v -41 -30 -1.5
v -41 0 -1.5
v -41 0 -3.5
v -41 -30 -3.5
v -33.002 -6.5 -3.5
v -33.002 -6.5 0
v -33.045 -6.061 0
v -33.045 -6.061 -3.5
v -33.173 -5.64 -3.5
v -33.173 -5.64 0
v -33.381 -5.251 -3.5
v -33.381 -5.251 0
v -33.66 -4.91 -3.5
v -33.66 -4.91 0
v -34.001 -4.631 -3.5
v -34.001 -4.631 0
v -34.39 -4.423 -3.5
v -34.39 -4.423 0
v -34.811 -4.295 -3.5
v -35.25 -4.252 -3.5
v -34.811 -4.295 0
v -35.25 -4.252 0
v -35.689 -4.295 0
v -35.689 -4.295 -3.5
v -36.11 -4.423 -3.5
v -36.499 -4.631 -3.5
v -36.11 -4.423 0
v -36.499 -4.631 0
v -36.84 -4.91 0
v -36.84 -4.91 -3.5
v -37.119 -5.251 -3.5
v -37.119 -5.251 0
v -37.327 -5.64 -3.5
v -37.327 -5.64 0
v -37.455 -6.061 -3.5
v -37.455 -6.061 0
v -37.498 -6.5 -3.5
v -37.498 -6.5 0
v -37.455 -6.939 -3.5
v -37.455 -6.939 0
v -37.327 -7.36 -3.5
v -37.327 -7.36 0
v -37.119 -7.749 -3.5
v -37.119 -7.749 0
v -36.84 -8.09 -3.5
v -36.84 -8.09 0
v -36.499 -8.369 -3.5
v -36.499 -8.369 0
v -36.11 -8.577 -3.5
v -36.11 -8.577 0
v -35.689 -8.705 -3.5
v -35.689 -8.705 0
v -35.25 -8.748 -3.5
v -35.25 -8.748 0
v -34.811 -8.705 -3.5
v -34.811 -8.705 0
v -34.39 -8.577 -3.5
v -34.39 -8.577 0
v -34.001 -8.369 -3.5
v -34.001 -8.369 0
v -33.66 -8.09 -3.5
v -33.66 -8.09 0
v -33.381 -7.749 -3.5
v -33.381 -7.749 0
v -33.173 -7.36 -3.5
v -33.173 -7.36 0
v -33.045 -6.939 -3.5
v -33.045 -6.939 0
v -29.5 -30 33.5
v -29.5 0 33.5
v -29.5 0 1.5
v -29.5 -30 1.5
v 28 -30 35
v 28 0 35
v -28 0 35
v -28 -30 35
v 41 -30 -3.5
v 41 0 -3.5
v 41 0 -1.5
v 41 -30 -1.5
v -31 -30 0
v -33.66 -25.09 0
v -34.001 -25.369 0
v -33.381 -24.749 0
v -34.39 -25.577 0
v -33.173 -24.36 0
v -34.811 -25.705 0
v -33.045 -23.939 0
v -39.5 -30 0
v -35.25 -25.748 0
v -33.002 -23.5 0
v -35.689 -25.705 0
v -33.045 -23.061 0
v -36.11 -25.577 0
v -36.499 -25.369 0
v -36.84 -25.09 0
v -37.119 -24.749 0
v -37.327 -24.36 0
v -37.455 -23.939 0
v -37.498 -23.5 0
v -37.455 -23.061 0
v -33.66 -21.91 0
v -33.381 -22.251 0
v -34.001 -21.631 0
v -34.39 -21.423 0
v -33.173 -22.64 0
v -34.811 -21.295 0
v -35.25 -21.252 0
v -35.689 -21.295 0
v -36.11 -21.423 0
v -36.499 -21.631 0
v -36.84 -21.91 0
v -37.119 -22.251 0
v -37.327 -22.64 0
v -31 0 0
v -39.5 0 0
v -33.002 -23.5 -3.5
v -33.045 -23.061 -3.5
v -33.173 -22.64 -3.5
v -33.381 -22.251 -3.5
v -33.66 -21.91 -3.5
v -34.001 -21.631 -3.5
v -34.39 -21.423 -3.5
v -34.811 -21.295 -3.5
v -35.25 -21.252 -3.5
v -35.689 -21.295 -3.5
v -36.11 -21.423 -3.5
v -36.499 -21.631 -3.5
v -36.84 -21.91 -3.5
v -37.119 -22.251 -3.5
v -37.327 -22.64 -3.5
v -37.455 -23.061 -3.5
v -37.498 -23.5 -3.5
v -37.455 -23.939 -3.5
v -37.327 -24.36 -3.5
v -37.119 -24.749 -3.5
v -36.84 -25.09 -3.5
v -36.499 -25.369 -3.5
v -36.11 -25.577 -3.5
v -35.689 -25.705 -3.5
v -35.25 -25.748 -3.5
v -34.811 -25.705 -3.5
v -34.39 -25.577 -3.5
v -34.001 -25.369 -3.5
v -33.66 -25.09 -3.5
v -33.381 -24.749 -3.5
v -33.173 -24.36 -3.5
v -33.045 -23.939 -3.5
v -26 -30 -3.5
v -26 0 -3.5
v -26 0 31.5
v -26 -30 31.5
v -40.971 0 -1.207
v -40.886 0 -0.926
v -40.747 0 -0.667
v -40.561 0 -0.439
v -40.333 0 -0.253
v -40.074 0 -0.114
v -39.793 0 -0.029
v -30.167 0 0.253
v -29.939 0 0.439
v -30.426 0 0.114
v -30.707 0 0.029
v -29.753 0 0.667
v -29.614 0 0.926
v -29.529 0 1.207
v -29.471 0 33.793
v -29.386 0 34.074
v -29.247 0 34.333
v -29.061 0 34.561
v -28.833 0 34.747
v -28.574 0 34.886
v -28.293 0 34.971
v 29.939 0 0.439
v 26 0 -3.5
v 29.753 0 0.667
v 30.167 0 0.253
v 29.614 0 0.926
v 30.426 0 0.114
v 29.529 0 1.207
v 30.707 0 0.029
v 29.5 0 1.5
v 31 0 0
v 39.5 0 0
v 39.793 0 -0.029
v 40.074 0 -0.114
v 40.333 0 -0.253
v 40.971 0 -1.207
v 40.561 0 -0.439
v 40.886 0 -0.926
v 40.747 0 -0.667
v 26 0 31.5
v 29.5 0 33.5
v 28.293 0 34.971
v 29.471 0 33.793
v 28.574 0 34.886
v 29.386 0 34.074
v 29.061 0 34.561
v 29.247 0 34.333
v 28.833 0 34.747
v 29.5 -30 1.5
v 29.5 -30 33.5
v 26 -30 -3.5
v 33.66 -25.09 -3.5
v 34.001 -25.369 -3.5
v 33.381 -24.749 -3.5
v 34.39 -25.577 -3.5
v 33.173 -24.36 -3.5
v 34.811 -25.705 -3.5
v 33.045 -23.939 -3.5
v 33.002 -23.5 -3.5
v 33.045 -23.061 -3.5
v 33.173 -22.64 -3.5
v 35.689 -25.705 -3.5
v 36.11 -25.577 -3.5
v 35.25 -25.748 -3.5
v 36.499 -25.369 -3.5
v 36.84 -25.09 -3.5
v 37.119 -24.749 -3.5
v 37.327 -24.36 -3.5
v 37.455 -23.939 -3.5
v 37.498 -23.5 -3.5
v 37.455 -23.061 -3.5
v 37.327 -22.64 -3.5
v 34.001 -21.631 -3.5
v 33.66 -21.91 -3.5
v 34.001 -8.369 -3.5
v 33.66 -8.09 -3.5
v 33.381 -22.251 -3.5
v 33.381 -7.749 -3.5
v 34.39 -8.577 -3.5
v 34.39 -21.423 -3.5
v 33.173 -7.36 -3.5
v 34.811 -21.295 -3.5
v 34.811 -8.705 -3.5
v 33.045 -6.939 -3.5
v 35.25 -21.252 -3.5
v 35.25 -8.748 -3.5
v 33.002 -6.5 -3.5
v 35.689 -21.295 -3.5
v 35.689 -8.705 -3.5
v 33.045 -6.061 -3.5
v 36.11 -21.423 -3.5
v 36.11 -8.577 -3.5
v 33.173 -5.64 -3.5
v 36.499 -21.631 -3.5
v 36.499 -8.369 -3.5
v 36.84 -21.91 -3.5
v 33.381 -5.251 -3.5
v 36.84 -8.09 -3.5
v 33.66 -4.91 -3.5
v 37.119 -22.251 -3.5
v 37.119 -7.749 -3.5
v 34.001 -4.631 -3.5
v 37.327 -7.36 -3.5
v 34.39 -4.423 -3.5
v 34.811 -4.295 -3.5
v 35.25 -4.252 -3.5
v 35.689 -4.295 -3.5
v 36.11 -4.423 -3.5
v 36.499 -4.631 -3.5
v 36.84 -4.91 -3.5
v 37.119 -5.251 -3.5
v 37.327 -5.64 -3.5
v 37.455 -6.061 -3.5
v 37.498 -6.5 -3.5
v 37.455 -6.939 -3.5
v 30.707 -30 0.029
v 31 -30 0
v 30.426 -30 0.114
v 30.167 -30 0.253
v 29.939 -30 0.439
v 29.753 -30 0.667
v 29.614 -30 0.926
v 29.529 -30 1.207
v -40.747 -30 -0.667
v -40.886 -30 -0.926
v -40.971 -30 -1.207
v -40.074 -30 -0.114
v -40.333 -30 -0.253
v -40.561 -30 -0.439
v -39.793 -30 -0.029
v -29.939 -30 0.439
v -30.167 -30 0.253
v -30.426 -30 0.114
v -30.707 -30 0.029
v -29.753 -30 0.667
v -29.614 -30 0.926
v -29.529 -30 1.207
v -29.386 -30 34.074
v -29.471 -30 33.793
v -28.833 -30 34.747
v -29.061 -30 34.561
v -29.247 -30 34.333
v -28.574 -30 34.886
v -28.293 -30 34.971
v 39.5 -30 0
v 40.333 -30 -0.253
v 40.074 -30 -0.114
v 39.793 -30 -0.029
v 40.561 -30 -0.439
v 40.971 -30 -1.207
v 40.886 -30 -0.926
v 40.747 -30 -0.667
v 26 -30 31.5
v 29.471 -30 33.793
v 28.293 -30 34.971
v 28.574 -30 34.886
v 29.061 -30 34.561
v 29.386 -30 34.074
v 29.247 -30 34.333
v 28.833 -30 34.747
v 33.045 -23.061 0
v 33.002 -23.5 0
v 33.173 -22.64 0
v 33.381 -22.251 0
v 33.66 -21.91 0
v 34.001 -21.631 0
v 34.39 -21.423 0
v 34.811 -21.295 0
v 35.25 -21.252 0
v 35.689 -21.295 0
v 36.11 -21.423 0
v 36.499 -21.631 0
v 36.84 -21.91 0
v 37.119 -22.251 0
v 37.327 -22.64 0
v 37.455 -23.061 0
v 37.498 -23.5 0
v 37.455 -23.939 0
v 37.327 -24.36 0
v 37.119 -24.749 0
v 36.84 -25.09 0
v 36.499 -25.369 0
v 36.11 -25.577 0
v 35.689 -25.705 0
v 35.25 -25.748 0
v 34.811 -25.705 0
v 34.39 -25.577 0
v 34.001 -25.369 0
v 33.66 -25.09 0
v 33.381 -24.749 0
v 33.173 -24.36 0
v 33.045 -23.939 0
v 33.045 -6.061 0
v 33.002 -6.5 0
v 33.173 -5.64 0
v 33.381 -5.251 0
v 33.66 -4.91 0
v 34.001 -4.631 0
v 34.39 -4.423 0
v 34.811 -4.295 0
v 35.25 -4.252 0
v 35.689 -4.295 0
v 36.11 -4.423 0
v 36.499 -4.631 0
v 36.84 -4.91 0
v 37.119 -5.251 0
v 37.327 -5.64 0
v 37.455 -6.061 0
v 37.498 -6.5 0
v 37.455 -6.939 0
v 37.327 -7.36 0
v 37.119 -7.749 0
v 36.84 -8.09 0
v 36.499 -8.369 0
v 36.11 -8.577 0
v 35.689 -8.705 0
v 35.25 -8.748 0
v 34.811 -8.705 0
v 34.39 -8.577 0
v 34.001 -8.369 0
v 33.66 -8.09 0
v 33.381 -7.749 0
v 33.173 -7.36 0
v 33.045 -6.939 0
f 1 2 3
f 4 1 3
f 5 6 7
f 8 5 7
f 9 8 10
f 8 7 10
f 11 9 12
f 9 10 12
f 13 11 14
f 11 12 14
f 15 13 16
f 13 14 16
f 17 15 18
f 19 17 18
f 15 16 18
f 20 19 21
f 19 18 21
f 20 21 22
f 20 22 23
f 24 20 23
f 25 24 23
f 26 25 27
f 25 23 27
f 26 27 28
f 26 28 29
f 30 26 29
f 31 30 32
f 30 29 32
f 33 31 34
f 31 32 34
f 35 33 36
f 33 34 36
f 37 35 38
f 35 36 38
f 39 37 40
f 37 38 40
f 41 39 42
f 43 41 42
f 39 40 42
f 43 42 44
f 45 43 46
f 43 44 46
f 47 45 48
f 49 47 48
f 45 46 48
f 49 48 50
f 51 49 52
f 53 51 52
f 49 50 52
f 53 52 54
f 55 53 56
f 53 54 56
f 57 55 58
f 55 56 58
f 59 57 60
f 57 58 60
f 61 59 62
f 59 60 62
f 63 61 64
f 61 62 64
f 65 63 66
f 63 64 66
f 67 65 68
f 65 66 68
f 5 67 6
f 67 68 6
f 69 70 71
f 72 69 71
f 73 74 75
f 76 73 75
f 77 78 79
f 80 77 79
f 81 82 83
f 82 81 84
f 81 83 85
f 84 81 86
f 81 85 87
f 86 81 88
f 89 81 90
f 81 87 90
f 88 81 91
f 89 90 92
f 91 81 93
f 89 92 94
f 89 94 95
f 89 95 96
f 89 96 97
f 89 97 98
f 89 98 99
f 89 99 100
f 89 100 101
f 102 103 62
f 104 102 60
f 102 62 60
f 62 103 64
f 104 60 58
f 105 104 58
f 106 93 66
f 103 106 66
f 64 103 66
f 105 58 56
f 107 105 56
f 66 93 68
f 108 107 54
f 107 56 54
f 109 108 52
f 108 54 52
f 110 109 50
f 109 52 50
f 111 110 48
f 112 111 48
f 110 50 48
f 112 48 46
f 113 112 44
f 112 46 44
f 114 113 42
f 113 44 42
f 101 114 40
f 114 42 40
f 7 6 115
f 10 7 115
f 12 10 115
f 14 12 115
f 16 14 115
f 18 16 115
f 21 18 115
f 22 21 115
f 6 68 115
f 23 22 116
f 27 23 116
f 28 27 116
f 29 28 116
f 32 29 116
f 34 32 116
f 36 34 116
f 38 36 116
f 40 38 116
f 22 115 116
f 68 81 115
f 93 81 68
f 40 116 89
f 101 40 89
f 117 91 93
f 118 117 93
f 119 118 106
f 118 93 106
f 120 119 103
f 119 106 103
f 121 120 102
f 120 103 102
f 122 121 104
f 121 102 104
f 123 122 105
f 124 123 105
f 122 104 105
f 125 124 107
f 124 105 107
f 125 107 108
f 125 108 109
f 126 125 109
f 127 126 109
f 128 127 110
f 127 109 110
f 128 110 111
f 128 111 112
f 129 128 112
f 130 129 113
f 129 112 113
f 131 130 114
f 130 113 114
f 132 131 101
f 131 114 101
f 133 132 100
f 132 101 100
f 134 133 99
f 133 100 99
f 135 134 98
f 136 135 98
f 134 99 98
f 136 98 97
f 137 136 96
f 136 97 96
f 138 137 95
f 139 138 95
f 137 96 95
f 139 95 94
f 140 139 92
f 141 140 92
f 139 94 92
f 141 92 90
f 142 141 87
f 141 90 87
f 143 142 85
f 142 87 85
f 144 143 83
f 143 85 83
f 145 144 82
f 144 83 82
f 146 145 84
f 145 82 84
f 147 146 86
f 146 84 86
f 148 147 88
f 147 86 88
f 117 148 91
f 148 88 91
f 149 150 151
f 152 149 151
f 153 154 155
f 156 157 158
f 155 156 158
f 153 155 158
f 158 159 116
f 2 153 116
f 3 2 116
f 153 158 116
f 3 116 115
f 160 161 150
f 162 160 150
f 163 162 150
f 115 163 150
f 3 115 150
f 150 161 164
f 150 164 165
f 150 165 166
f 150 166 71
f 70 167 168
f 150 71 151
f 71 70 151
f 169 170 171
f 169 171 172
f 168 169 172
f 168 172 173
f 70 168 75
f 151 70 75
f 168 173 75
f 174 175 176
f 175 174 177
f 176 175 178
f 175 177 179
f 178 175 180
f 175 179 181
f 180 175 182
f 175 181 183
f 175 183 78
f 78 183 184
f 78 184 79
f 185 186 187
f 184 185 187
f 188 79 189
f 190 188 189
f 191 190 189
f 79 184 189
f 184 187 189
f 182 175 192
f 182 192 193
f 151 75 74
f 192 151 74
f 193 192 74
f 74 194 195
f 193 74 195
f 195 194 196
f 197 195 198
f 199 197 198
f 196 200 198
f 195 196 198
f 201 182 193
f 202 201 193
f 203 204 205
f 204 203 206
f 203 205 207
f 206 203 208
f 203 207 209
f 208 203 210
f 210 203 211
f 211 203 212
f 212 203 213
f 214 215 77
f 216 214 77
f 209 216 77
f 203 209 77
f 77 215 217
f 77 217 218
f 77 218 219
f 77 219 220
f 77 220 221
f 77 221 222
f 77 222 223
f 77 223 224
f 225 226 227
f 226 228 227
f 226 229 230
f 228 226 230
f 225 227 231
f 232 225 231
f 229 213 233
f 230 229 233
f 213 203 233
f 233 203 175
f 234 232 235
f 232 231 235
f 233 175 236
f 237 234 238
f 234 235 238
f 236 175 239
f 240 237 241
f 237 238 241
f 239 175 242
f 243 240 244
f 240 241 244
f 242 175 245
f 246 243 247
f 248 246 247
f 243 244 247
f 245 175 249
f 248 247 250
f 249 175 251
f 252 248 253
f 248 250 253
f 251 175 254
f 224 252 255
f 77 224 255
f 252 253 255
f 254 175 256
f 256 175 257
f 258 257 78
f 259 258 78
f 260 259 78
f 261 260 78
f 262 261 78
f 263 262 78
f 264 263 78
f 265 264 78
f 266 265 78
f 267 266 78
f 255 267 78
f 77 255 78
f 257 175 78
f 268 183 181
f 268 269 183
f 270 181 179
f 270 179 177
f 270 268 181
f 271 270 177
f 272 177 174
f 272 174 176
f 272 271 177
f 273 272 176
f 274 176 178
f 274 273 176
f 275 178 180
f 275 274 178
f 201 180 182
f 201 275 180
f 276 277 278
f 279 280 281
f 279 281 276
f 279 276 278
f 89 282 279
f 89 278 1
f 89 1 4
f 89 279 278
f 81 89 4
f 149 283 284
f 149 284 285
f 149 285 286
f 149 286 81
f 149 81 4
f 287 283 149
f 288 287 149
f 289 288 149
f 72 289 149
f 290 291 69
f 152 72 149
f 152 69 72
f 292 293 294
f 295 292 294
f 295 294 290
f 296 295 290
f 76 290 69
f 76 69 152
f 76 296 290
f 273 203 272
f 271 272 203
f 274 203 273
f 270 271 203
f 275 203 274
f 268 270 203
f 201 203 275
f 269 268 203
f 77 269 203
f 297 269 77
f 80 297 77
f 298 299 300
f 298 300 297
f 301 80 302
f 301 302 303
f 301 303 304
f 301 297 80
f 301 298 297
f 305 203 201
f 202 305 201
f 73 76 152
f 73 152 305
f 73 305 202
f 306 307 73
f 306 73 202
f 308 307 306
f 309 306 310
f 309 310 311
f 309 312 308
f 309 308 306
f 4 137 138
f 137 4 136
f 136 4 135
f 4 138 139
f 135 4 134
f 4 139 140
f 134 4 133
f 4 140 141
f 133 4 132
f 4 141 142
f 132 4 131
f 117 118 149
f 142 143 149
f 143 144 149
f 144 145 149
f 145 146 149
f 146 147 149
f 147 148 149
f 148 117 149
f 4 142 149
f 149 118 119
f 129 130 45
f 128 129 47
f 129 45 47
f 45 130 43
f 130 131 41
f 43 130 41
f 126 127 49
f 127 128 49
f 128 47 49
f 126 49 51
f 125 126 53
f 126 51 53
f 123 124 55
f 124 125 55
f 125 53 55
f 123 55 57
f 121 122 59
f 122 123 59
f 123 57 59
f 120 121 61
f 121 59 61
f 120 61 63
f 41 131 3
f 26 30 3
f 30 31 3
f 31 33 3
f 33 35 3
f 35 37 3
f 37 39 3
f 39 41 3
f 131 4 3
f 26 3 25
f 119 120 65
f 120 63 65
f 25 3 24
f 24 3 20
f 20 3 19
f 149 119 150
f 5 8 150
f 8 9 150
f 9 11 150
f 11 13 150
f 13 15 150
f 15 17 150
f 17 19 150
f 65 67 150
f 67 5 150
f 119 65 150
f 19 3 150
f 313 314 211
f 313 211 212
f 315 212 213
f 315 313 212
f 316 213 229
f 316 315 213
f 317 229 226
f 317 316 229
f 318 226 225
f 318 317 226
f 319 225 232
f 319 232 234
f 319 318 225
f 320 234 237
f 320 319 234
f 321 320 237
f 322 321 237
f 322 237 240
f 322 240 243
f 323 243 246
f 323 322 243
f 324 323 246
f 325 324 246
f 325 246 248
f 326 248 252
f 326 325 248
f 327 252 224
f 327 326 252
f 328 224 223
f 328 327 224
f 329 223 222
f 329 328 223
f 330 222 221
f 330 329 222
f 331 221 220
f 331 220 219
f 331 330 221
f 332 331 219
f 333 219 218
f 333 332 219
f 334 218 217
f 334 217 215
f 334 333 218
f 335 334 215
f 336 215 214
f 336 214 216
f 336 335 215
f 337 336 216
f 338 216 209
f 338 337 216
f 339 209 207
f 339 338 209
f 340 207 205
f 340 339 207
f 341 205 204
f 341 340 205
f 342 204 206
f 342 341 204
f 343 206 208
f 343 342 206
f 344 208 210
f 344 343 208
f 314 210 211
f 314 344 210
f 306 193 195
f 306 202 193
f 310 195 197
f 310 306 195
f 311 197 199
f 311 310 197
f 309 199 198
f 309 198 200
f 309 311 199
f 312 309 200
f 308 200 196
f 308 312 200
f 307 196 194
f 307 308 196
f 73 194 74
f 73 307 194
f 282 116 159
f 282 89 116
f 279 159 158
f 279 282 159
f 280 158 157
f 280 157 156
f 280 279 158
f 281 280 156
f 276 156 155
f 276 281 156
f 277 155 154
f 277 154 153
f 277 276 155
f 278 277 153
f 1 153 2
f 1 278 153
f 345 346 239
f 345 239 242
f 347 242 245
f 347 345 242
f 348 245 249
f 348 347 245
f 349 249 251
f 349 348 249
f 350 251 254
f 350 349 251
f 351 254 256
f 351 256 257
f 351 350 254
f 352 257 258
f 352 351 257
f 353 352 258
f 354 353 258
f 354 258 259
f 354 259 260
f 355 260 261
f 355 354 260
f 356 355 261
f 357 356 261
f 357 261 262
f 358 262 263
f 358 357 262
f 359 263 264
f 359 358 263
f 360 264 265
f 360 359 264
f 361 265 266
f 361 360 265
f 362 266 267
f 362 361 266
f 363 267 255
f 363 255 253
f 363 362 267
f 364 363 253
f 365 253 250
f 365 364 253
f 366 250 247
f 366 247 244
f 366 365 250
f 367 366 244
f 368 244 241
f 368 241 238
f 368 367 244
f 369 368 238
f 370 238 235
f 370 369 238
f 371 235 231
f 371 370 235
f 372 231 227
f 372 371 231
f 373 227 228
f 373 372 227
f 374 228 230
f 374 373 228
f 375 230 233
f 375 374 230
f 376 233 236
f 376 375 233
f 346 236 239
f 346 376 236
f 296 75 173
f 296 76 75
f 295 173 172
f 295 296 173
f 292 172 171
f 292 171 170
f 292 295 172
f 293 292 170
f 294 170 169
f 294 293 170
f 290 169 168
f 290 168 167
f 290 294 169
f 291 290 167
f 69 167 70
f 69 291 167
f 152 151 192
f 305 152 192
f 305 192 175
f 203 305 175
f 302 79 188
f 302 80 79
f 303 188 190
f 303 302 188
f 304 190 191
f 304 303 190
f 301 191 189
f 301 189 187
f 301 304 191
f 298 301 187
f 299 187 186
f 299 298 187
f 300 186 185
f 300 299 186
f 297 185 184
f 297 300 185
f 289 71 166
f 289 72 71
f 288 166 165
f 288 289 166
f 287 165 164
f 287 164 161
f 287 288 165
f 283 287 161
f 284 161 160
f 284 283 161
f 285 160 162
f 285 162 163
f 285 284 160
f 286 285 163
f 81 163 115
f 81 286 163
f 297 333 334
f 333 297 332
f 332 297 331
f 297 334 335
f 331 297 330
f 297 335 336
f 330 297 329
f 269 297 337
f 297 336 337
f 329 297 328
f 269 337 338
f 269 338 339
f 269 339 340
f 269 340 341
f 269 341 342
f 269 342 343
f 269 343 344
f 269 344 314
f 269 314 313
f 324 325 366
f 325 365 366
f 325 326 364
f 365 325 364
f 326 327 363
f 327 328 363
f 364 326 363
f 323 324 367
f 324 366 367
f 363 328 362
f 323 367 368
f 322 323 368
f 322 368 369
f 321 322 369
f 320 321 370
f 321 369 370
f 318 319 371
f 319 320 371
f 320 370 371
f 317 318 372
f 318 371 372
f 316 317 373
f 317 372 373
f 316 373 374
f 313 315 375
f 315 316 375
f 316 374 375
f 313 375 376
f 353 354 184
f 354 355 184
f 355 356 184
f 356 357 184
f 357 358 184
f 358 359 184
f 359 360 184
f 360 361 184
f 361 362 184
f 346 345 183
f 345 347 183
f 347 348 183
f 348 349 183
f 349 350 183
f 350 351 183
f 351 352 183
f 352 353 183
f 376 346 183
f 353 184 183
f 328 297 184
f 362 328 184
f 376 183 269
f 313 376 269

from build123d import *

# Parameters (mm, degrees)
F1_DEPTH = 30
F2_R     = 2.2479
F3_DEPTH = 3.5
F4_R     = 1.5


# Not quite as in the source:
# - a pattern or mirror of a feature is missing from the dataset's text; its kind, count and spacing are read off the source's solid


with BuildPart() as f1:
    # F0 (on Front) → F1 (new body)
    with BuildSketch(Plane.XZ):
        Polygon((-26, 0), (-26, 31.5), (26, 31.5), (26, 0), (29.5, 0), (29.5, 35), (-29.5, 35), (-29.5, 0), align=None)
        Polygon((-26, -3.5), (-26, 0), (-29.5, 0), (-41, 0), (-41, -3.5), align=None)
        Polygon((29.5, 0), (26, 0), (26, -3.5), (41, -3.5), (41, 0), align=None)
    extrude(amount=F1_DEPTH)

    # F2 (on face) → F3 (cut, through all)
    with BuildSketch(Plane.XY):
        with Locations((-35.25, -23.5)):
            Circle(F2_R)
        with Locations((-35.25, -6.5)):
            Circle(F2_R)
    f3 = extrude(amount=-F3_DEPTH, mode=Mode.SUBTRACT)

    # F3_copies: F3 across plane
    add(f3.mirror(Plane(origin=(0, 0, 0), x_dir=(0, 0, 1), z_dir=(1, 0, 0))), mode=Mode.SUBTRACT)

    # F4
    f4_edges = [f1.edges().sort_by_distance(p)[0] for p in [
        (-29.5, -15, 35),
        (-29.5, -15, 0),
        (-41, -15, 0),
        (29.5, -15, 35),
        (29.5, -15, 0),
        (41, -15, 0),
    ]]
    fillet(f4_edges, radius=F4_R)


solid = f1.part
